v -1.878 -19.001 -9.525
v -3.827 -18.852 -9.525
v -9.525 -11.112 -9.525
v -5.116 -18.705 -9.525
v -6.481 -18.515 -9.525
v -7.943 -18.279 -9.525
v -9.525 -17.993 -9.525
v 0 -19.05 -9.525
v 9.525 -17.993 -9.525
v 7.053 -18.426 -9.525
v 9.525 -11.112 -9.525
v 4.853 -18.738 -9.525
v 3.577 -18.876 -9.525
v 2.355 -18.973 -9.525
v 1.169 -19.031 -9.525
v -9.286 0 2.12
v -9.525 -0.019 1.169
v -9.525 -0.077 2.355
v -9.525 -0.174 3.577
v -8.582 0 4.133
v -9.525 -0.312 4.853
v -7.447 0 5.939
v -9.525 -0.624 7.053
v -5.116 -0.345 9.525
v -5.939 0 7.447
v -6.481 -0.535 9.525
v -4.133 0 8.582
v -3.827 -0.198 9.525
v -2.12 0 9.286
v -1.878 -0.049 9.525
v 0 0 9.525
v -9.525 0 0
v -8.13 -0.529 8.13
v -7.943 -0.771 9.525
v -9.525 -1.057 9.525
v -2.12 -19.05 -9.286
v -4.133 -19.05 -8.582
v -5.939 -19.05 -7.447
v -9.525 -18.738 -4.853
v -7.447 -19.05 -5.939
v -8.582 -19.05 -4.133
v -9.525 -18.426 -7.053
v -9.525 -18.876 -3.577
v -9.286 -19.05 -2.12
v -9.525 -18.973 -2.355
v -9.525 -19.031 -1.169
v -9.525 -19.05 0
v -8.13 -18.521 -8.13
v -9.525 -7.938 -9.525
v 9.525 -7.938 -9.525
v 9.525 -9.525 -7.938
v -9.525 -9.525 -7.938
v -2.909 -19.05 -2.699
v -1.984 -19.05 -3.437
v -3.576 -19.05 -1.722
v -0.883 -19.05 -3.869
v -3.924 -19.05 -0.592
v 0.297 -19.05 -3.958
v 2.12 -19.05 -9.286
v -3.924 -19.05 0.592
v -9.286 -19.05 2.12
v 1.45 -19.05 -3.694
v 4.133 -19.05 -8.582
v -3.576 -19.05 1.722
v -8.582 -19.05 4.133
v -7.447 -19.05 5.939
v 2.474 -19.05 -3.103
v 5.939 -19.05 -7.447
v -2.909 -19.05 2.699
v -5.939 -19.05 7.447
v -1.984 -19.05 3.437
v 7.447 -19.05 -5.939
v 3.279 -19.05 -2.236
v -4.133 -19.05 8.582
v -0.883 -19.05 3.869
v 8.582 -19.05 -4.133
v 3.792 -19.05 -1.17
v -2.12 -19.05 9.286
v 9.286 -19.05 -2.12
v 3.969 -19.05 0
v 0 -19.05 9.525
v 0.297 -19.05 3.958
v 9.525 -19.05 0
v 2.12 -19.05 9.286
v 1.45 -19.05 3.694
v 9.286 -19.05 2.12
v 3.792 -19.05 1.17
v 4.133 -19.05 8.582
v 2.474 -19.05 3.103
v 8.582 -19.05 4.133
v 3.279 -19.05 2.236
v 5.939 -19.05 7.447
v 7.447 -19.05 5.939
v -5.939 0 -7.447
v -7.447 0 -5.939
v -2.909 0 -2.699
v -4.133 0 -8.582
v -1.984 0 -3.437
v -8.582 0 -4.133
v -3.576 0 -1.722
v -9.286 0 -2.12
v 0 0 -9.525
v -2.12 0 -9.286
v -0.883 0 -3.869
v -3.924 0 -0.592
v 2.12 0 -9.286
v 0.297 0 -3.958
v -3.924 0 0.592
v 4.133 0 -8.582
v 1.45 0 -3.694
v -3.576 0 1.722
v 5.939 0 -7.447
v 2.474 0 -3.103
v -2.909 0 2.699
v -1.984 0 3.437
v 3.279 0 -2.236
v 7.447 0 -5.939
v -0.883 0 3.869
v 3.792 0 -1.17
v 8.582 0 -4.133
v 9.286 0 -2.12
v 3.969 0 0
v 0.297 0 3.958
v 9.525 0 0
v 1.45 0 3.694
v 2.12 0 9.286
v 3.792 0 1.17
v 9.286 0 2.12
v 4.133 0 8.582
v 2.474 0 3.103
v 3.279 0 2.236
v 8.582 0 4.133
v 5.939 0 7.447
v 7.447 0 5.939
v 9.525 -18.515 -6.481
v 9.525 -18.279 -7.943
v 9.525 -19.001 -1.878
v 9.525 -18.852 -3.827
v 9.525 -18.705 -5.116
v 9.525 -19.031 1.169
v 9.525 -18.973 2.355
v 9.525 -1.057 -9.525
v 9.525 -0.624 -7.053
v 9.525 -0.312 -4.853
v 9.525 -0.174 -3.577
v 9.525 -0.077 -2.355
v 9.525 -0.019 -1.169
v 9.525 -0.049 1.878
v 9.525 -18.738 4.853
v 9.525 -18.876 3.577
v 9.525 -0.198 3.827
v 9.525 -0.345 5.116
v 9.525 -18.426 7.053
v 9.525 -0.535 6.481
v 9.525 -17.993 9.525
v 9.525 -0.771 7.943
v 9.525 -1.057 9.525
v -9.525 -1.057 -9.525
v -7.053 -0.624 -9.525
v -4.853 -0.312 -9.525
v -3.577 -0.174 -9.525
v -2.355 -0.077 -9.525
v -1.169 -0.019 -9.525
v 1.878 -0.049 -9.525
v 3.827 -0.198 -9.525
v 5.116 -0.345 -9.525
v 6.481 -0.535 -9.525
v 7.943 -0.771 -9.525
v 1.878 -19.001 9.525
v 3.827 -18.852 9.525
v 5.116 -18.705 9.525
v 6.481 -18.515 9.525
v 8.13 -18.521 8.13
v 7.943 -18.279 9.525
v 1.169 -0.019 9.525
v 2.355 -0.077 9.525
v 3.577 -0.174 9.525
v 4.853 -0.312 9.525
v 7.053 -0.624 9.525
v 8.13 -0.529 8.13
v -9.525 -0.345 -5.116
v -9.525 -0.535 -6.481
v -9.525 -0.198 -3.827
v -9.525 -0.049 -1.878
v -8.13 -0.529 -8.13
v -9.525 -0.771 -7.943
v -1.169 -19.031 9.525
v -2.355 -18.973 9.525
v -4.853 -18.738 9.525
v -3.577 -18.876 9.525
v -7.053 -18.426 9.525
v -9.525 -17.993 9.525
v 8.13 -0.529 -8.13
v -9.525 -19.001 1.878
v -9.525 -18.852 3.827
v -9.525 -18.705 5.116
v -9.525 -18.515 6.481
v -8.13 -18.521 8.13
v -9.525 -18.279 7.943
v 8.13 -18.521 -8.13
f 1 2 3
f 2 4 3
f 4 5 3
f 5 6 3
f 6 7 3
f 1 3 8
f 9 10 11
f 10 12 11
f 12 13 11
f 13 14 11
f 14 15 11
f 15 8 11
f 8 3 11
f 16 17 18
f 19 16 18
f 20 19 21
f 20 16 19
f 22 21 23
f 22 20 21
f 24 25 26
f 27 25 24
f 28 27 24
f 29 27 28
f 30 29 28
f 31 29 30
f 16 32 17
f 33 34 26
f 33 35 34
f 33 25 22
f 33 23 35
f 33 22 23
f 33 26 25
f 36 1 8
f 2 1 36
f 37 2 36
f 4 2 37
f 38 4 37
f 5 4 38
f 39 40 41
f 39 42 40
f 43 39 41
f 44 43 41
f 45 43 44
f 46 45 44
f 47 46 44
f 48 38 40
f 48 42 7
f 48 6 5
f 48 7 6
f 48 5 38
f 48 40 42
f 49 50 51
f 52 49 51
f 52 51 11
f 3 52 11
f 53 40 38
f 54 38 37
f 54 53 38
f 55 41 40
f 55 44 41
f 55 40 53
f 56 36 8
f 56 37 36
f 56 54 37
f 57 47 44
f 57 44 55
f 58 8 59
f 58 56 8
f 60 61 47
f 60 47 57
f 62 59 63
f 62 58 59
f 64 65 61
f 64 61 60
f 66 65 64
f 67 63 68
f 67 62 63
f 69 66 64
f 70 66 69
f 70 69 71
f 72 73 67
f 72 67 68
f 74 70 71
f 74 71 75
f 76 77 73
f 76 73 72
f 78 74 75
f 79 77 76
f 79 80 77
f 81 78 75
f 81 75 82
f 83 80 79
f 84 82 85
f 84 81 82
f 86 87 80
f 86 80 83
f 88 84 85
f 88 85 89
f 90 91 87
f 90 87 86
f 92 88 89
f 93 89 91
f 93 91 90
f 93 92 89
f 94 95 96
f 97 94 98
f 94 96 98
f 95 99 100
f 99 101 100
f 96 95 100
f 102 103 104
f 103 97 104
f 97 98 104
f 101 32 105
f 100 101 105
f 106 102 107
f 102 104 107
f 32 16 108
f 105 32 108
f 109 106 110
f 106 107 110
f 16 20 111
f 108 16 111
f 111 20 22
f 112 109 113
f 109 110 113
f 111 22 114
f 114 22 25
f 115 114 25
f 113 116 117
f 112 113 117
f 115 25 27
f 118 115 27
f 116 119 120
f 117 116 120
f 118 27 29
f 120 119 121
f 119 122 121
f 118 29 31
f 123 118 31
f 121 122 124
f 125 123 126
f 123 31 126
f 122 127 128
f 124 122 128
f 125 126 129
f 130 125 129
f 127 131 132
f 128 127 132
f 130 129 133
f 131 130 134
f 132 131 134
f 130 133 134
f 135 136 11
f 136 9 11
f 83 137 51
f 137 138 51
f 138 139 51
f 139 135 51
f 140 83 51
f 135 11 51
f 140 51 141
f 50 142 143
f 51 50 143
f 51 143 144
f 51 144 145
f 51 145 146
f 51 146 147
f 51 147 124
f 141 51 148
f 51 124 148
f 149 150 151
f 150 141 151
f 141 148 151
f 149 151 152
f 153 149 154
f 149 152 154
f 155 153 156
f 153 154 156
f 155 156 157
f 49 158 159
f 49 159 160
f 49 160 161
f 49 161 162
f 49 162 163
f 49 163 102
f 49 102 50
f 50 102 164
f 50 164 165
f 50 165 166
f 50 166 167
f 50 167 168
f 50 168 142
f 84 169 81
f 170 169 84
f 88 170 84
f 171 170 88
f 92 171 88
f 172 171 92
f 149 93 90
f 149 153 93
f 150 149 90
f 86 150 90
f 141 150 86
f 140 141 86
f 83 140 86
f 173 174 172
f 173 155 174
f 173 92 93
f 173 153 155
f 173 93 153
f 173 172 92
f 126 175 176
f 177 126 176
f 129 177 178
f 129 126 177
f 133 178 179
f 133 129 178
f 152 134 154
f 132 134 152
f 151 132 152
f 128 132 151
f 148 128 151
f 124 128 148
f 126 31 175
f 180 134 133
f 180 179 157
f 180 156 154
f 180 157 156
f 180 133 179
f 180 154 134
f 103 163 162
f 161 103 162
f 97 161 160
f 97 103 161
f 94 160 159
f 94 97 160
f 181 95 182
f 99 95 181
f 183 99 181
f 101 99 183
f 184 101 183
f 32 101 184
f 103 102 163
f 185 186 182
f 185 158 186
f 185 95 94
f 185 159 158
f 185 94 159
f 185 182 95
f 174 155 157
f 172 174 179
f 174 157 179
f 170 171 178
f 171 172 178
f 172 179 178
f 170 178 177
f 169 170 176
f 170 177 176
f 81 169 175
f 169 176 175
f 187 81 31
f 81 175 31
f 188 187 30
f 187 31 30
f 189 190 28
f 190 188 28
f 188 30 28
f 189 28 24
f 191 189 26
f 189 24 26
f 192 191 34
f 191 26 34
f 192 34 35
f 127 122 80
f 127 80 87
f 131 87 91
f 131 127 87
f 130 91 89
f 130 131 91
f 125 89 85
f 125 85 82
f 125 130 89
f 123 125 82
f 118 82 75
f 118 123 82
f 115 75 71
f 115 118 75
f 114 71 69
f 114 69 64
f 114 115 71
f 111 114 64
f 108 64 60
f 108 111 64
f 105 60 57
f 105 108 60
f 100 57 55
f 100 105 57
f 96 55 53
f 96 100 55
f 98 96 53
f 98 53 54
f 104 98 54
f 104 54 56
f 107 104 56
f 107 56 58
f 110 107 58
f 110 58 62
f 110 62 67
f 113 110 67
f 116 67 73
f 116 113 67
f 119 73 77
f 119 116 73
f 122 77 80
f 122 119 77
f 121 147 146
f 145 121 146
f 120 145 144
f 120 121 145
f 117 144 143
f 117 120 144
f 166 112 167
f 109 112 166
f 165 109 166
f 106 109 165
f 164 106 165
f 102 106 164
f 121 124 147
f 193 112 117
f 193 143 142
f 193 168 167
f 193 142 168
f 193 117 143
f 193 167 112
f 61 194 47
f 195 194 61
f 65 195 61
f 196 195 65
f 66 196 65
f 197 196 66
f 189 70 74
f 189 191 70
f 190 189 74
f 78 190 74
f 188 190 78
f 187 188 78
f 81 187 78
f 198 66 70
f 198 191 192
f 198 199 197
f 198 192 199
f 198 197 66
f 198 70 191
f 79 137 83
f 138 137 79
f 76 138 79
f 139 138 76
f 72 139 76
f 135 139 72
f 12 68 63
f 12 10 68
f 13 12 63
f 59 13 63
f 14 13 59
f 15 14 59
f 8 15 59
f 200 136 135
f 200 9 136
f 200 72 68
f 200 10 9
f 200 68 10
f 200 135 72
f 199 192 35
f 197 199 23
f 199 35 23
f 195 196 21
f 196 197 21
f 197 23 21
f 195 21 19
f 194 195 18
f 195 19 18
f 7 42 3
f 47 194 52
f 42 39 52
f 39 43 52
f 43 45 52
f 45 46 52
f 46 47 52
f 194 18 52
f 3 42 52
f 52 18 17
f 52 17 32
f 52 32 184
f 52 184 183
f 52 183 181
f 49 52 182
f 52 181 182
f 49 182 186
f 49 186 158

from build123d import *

# Parameters (mm, degrees)
F0_R     = 3.96875
F1_DEPTH = 19.05
F3_DEPTH = 19.05


with BuildPart() as f1:
    # F0 (on Front) → F1 (new body)
    with BuildSketch(Plane.XZ):
        with BuildLine():
            Line((-9.525, 0), (-9.525, -9.525))
            Line((-9.525, -9.525), (0, -9.525))
            ThreePointArc((0, -9.525), (-6.7351920908, -6.7351920908), (-9.525, 0))
        make_face()
        with BuildLine():
            ThreePointArc((9.525, 0), (6.7351920908, -6.7351920908), (0, -9.525))
            Line((0, -9.525), (9.525, -9.525))
            Line((9.525, -9.525), (9.525, 0))
        make_face()
        with BuildLine():
            ThreePointArc((-9.525, 0), (-6.7351920908, -6.7351920908), (0, -9.525))
            ThreePointArc((0, -9.525), (6.7351920908, -6.7351920908), (9.525, 0))
            ThreePointArc((9.525, 0), (6.7351920908, 6.7351920908), (0, 9.525))
            ThreePointArc((0, 9.525), (-6.7351920908, 6.7351920908), (-9.525, 0))
        make_face()
        Circle(F0_R, mode=Mode.SUBTRACT)
        with BuildLine():
            Line((-9.525, 9.525), (-9.525, 0))
            ThreePointArc((-9.525, 0), (-6.7351920908, 6.7351920908), (0, 9.525))
            Line((0, 9.525), (-9.525, 9.525))
        make_face()
        with BuildLine():
            ThreePointArc((0, 9.525), (6.7351920908, 6.7351920908), (9.525, 0))
            Line((9.525, 0), (9.525, 9.525))
            Line((9.525, 9.525), (0, 9.525))
        make_face()
    extrude(amount=F1_DEPTH)

    # F2 (on face) → F3 (cut)
    with BuildSketch(Plane.YZ.offset(9.525)):
        Polygon((-7.9375, -9.525), (-9.525, -7.9375), (-11.1125, -9.525), align=None)
    extrude(amount=-F3_DEPTH, mode=Mode.SUBTRACT)

    # F5 (on mid) → F6 (revolve, cut)
    with BuildSketch(Plane.YZ):
        Polygon((-19.05, 20.5410033949), (-19.05, 9.525), (-16.0982707865, 20.5410033949), align=None)
        Polygon((-2.9517292135, 20.5410033949), (0, 9.525), (0, 20.5410033949), align=None)
    revolve(axis=Axis((0, 0, 0), (0, 1, 0)), mode=Mode.SUBTRACT)


solid = f1.part
